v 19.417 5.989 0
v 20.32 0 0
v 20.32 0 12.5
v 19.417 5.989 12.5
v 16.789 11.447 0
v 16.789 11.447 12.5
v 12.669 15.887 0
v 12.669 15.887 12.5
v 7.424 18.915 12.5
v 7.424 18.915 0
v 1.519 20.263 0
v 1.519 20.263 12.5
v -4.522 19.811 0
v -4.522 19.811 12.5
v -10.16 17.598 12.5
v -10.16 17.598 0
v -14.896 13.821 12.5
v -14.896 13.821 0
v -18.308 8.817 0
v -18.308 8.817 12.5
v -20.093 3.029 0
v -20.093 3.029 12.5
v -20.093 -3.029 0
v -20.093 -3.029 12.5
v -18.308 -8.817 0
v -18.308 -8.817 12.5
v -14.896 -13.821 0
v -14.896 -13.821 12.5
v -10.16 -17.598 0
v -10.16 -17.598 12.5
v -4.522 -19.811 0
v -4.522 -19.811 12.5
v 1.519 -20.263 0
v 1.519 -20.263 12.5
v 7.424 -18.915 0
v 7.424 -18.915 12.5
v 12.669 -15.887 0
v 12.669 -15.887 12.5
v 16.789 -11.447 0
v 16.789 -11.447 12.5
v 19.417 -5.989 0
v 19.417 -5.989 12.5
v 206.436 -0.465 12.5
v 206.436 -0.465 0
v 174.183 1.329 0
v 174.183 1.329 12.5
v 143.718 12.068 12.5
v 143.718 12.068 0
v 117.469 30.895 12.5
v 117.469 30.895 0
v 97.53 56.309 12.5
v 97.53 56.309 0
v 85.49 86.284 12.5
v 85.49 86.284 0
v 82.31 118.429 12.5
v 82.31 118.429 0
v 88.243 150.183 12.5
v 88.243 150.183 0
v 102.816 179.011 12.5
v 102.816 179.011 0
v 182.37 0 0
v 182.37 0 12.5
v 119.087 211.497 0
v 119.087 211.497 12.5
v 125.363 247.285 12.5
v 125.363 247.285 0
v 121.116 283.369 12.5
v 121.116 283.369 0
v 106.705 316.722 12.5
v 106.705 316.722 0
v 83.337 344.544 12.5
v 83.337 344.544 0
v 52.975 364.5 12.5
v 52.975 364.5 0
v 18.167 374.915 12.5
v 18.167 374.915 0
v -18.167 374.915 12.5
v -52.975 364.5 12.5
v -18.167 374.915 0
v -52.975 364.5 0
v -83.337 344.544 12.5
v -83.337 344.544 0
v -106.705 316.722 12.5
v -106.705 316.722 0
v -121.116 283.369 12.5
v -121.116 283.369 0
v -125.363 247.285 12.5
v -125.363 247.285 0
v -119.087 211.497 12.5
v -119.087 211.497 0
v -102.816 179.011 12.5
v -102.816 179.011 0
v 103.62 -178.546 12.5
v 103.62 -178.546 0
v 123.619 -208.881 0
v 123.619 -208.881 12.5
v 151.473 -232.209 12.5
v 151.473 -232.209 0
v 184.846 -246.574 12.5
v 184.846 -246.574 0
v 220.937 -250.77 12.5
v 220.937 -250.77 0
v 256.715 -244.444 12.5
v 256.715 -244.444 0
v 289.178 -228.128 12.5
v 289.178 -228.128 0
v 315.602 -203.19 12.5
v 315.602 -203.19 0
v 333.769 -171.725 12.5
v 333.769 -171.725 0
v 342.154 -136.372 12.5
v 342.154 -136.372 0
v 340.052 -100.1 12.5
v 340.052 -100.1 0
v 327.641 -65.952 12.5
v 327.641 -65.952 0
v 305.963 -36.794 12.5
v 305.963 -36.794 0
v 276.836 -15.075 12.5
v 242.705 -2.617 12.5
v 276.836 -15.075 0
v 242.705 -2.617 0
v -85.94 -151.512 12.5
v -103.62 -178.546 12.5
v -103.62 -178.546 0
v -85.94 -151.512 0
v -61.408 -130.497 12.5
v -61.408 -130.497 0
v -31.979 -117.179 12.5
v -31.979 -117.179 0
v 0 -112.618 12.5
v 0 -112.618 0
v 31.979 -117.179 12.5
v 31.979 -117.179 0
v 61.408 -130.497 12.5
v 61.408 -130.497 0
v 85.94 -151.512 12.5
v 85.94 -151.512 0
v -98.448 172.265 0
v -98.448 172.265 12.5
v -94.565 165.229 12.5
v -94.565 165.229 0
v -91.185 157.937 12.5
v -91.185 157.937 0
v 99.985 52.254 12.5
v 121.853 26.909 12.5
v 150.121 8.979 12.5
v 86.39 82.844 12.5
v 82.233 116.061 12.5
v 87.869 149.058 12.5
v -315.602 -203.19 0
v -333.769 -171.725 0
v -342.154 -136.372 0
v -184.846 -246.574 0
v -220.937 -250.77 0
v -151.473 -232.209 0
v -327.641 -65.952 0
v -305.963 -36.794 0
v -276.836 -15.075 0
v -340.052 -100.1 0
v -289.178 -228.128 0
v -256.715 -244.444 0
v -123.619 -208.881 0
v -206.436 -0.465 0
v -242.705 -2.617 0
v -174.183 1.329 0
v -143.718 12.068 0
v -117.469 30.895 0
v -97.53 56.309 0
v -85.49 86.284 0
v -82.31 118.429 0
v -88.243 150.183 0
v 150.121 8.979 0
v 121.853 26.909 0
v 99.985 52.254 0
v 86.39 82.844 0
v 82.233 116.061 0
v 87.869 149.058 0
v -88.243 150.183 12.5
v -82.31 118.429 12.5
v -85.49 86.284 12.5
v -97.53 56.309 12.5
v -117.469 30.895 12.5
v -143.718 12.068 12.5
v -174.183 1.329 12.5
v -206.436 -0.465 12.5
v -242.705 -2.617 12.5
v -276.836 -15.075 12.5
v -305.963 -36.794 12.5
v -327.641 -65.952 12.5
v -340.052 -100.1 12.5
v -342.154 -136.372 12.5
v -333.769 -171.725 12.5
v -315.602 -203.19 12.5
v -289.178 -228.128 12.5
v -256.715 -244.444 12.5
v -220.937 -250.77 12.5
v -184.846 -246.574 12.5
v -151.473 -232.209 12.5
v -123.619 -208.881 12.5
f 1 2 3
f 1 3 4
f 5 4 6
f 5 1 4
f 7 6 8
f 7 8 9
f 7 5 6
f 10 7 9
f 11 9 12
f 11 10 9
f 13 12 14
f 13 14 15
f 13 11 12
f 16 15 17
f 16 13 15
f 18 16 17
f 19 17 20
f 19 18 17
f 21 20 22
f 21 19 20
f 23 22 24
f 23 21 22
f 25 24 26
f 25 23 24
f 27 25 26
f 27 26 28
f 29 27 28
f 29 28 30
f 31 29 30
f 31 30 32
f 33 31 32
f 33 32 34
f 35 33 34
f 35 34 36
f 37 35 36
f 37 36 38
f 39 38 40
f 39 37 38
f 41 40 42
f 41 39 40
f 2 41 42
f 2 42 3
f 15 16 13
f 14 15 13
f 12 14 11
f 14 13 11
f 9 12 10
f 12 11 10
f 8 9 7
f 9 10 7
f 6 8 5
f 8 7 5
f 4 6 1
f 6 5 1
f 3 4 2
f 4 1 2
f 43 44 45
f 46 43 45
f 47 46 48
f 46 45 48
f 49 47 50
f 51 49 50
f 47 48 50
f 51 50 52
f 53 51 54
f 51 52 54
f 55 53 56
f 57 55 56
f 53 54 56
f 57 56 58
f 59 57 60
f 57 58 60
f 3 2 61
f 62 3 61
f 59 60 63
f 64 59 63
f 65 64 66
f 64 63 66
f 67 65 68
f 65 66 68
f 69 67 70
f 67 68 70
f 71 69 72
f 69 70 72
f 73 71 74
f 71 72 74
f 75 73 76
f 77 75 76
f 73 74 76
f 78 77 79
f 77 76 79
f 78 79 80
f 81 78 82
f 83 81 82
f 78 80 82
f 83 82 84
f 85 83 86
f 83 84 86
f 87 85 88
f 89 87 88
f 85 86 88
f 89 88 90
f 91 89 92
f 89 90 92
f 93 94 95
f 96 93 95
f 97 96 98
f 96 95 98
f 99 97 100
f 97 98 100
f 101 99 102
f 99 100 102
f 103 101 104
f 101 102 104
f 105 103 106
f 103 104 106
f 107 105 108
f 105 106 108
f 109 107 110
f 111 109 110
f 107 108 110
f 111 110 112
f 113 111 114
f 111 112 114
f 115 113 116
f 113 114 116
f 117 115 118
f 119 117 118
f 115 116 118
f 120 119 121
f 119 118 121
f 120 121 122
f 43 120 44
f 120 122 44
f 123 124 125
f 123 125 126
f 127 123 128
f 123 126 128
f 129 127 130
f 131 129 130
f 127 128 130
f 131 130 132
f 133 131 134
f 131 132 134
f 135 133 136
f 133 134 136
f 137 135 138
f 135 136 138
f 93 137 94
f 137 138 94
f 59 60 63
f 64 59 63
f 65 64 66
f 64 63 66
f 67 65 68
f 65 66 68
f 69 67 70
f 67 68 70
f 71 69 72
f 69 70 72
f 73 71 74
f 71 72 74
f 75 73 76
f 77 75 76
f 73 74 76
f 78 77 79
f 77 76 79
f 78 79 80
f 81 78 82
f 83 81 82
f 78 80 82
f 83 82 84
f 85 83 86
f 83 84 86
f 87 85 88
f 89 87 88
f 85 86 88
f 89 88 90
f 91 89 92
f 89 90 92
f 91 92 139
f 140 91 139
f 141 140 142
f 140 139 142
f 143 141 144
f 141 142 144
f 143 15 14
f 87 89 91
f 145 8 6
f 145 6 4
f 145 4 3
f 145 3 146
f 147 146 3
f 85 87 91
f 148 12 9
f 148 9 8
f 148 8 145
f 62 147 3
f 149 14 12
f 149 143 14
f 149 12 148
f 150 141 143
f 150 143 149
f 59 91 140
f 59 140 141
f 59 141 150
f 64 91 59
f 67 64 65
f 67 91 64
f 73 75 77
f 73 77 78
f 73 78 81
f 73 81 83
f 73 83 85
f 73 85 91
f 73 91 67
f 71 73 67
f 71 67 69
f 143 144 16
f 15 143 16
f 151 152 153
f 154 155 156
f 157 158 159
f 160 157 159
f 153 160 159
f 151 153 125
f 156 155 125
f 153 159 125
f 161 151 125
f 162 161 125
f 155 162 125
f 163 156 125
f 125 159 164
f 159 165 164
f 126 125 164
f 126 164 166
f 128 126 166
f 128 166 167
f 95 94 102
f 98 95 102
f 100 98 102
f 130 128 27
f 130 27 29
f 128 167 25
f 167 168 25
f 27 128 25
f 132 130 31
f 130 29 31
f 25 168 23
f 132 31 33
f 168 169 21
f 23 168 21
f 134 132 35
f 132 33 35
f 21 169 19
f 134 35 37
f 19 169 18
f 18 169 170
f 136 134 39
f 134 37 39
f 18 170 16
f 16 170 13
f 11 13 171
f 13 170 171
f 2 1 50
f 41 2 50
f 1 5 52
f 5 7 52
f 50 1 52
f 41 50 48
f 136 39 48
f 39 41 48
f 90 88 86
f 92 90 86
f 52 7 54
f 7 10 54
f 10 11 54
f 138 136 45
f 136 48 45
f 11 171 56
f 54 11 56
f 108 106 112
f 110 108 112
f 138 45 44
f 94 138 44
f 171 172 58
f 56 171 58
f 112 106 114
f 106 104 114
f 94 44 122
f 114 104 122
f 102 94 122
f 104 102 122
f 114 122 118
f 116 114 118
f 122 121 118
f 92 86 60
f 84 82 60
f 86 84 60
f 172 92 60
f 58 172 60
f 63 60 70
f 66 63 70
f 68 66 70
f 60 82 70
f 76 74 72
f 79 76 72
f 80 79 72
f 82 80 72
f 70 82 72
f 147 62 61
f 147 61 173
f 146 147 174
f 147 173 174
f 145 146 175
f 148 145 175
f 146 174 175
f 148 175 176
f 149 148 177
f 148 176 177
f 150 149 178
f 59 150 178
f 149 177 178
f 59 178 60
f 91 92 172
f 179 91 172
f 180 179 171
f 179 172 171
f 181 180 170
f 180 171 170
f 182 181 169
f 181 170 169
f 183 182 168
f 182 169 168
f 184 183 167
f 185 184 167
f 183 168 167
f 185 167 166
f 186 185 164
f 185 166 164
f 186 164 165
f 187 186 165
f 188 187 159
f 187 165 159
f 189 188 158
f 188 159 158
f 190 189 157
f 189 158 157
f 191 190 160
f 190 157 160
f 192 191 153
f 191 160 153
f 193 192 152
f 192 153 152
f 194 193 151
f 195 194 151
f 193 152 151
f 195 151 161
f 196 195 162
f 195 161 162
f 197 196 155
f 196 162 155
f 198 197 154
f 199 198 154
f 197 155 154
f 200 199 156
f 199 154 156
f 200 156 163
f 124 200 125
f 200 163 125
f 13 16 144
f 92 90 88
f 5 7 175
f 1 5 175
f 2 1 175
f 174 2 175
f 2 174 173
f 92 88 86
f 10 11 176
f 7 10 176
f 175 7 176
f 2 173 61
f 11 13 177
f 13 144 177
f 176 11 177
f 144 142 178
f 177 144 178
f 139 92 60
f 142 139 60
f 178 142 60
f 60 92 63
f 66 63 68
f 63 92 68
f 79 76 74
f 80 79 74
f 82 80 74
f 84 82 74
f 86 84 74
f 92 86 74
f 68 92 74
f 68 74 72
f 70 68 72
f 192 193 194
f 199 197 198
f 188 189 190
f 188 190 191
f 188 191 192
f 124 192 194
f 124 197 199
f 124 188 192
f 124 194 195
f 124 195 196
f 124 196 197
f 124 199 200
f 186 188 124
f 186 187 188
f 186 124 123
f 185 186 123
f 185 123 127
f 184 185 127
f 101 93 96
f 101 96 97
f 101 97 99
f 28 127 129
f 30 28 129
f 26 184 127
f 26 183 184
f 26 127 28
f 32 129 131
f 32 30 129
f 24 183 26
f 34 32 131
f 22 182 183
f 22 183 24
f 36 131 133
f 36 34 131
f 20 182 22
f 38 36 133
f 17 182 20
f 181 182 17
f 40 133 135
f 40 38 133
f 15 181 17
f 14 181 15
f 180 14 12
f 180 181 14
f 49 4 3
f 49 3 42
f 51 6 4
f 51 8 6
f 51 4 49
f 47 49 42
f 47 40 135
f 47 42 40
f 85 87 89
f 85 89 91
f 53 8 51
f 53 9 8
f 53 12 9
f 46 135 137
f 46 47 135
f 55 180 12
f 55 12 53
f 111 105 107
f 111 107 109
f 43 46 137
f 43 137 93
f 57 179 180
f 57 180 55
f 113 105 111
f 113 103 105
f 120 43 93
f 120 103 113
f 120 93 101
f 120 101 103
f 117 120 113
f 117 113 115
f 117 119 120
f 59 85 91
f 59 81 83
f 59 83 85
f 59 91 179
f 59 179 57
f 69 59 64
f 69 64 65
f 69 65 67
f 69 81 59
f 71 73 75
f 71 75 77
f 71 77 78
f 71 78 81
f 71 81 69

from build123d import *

# Parameters (mm, degrees)
F0_R     = 100.0125
F0_R_2   = 20.32
F1_DEPTH = 12.5
F3_DEPTH = 12.5


with BuildPart() as f1:
    # F0 (on Top) → F1 (new body)
    with BuildSketch(Plane.XY):
        with BuildLine():
            ThreePointArc((206.435964, -0.464583), (97.529962, 56.30895), (102.815642, 179.011081))
            ThreePointArc((102.815642, 179.011081), (0, 376.2375), (-102.815642, 179.011081))
            ThreePointArc((-102.815642, 179.011081), (-97.529962, 56.30895), (-206.435964, -0.464583))
            ThreePointArc((-206.435964, -0.464583), (-325.831233, -188.11875), (-103.620323, -178.546498))
            ThreePointArc((-103.620323, -178.546498), (0, -112.617899), (103.620323, -178.546498))
            ThreePointArc((103.620323, -178.546498), (325.831233, -188.11875), (206.435964, -0.464583))
        make_face()
        Circle(F0_R, mode=Mode.SUBTRACT)
        Circle(F0_R)
        Circle(F0_R_2, mode=Mode.SUBTRACT)
    extrude(amount=F1_DEPTH)


with BuildPart() as f3:
    # F2 (on Top) → F3 (new body)
    with BuildSketch(Plane.XY):
        with BuildLine():
            ThreePointArc((182.369894, 0), (92.062135, 67.049239), (102.815642, 179.011081))
            ThreePointArc((102.815642, 179.011081), (0, 376.2375), (-102.815642, 179.011081))
            ThreePointArc((-102.815642, 179.011081), (-96.444458, 168.780784), (-91.184947, 157.936961))
            Line((-91.184947, 157.936961), (-10.16, 17.597636))
            ThreePointArc((-10.16, 17.597636), (10.16, 17.597636), (20.32, 0))
            Line((20.32, 0), (182.369894, 0))
        make_face()
    extrude(amount=F3_DEPTH)


solid = Compound([f1.part, f3.part])
